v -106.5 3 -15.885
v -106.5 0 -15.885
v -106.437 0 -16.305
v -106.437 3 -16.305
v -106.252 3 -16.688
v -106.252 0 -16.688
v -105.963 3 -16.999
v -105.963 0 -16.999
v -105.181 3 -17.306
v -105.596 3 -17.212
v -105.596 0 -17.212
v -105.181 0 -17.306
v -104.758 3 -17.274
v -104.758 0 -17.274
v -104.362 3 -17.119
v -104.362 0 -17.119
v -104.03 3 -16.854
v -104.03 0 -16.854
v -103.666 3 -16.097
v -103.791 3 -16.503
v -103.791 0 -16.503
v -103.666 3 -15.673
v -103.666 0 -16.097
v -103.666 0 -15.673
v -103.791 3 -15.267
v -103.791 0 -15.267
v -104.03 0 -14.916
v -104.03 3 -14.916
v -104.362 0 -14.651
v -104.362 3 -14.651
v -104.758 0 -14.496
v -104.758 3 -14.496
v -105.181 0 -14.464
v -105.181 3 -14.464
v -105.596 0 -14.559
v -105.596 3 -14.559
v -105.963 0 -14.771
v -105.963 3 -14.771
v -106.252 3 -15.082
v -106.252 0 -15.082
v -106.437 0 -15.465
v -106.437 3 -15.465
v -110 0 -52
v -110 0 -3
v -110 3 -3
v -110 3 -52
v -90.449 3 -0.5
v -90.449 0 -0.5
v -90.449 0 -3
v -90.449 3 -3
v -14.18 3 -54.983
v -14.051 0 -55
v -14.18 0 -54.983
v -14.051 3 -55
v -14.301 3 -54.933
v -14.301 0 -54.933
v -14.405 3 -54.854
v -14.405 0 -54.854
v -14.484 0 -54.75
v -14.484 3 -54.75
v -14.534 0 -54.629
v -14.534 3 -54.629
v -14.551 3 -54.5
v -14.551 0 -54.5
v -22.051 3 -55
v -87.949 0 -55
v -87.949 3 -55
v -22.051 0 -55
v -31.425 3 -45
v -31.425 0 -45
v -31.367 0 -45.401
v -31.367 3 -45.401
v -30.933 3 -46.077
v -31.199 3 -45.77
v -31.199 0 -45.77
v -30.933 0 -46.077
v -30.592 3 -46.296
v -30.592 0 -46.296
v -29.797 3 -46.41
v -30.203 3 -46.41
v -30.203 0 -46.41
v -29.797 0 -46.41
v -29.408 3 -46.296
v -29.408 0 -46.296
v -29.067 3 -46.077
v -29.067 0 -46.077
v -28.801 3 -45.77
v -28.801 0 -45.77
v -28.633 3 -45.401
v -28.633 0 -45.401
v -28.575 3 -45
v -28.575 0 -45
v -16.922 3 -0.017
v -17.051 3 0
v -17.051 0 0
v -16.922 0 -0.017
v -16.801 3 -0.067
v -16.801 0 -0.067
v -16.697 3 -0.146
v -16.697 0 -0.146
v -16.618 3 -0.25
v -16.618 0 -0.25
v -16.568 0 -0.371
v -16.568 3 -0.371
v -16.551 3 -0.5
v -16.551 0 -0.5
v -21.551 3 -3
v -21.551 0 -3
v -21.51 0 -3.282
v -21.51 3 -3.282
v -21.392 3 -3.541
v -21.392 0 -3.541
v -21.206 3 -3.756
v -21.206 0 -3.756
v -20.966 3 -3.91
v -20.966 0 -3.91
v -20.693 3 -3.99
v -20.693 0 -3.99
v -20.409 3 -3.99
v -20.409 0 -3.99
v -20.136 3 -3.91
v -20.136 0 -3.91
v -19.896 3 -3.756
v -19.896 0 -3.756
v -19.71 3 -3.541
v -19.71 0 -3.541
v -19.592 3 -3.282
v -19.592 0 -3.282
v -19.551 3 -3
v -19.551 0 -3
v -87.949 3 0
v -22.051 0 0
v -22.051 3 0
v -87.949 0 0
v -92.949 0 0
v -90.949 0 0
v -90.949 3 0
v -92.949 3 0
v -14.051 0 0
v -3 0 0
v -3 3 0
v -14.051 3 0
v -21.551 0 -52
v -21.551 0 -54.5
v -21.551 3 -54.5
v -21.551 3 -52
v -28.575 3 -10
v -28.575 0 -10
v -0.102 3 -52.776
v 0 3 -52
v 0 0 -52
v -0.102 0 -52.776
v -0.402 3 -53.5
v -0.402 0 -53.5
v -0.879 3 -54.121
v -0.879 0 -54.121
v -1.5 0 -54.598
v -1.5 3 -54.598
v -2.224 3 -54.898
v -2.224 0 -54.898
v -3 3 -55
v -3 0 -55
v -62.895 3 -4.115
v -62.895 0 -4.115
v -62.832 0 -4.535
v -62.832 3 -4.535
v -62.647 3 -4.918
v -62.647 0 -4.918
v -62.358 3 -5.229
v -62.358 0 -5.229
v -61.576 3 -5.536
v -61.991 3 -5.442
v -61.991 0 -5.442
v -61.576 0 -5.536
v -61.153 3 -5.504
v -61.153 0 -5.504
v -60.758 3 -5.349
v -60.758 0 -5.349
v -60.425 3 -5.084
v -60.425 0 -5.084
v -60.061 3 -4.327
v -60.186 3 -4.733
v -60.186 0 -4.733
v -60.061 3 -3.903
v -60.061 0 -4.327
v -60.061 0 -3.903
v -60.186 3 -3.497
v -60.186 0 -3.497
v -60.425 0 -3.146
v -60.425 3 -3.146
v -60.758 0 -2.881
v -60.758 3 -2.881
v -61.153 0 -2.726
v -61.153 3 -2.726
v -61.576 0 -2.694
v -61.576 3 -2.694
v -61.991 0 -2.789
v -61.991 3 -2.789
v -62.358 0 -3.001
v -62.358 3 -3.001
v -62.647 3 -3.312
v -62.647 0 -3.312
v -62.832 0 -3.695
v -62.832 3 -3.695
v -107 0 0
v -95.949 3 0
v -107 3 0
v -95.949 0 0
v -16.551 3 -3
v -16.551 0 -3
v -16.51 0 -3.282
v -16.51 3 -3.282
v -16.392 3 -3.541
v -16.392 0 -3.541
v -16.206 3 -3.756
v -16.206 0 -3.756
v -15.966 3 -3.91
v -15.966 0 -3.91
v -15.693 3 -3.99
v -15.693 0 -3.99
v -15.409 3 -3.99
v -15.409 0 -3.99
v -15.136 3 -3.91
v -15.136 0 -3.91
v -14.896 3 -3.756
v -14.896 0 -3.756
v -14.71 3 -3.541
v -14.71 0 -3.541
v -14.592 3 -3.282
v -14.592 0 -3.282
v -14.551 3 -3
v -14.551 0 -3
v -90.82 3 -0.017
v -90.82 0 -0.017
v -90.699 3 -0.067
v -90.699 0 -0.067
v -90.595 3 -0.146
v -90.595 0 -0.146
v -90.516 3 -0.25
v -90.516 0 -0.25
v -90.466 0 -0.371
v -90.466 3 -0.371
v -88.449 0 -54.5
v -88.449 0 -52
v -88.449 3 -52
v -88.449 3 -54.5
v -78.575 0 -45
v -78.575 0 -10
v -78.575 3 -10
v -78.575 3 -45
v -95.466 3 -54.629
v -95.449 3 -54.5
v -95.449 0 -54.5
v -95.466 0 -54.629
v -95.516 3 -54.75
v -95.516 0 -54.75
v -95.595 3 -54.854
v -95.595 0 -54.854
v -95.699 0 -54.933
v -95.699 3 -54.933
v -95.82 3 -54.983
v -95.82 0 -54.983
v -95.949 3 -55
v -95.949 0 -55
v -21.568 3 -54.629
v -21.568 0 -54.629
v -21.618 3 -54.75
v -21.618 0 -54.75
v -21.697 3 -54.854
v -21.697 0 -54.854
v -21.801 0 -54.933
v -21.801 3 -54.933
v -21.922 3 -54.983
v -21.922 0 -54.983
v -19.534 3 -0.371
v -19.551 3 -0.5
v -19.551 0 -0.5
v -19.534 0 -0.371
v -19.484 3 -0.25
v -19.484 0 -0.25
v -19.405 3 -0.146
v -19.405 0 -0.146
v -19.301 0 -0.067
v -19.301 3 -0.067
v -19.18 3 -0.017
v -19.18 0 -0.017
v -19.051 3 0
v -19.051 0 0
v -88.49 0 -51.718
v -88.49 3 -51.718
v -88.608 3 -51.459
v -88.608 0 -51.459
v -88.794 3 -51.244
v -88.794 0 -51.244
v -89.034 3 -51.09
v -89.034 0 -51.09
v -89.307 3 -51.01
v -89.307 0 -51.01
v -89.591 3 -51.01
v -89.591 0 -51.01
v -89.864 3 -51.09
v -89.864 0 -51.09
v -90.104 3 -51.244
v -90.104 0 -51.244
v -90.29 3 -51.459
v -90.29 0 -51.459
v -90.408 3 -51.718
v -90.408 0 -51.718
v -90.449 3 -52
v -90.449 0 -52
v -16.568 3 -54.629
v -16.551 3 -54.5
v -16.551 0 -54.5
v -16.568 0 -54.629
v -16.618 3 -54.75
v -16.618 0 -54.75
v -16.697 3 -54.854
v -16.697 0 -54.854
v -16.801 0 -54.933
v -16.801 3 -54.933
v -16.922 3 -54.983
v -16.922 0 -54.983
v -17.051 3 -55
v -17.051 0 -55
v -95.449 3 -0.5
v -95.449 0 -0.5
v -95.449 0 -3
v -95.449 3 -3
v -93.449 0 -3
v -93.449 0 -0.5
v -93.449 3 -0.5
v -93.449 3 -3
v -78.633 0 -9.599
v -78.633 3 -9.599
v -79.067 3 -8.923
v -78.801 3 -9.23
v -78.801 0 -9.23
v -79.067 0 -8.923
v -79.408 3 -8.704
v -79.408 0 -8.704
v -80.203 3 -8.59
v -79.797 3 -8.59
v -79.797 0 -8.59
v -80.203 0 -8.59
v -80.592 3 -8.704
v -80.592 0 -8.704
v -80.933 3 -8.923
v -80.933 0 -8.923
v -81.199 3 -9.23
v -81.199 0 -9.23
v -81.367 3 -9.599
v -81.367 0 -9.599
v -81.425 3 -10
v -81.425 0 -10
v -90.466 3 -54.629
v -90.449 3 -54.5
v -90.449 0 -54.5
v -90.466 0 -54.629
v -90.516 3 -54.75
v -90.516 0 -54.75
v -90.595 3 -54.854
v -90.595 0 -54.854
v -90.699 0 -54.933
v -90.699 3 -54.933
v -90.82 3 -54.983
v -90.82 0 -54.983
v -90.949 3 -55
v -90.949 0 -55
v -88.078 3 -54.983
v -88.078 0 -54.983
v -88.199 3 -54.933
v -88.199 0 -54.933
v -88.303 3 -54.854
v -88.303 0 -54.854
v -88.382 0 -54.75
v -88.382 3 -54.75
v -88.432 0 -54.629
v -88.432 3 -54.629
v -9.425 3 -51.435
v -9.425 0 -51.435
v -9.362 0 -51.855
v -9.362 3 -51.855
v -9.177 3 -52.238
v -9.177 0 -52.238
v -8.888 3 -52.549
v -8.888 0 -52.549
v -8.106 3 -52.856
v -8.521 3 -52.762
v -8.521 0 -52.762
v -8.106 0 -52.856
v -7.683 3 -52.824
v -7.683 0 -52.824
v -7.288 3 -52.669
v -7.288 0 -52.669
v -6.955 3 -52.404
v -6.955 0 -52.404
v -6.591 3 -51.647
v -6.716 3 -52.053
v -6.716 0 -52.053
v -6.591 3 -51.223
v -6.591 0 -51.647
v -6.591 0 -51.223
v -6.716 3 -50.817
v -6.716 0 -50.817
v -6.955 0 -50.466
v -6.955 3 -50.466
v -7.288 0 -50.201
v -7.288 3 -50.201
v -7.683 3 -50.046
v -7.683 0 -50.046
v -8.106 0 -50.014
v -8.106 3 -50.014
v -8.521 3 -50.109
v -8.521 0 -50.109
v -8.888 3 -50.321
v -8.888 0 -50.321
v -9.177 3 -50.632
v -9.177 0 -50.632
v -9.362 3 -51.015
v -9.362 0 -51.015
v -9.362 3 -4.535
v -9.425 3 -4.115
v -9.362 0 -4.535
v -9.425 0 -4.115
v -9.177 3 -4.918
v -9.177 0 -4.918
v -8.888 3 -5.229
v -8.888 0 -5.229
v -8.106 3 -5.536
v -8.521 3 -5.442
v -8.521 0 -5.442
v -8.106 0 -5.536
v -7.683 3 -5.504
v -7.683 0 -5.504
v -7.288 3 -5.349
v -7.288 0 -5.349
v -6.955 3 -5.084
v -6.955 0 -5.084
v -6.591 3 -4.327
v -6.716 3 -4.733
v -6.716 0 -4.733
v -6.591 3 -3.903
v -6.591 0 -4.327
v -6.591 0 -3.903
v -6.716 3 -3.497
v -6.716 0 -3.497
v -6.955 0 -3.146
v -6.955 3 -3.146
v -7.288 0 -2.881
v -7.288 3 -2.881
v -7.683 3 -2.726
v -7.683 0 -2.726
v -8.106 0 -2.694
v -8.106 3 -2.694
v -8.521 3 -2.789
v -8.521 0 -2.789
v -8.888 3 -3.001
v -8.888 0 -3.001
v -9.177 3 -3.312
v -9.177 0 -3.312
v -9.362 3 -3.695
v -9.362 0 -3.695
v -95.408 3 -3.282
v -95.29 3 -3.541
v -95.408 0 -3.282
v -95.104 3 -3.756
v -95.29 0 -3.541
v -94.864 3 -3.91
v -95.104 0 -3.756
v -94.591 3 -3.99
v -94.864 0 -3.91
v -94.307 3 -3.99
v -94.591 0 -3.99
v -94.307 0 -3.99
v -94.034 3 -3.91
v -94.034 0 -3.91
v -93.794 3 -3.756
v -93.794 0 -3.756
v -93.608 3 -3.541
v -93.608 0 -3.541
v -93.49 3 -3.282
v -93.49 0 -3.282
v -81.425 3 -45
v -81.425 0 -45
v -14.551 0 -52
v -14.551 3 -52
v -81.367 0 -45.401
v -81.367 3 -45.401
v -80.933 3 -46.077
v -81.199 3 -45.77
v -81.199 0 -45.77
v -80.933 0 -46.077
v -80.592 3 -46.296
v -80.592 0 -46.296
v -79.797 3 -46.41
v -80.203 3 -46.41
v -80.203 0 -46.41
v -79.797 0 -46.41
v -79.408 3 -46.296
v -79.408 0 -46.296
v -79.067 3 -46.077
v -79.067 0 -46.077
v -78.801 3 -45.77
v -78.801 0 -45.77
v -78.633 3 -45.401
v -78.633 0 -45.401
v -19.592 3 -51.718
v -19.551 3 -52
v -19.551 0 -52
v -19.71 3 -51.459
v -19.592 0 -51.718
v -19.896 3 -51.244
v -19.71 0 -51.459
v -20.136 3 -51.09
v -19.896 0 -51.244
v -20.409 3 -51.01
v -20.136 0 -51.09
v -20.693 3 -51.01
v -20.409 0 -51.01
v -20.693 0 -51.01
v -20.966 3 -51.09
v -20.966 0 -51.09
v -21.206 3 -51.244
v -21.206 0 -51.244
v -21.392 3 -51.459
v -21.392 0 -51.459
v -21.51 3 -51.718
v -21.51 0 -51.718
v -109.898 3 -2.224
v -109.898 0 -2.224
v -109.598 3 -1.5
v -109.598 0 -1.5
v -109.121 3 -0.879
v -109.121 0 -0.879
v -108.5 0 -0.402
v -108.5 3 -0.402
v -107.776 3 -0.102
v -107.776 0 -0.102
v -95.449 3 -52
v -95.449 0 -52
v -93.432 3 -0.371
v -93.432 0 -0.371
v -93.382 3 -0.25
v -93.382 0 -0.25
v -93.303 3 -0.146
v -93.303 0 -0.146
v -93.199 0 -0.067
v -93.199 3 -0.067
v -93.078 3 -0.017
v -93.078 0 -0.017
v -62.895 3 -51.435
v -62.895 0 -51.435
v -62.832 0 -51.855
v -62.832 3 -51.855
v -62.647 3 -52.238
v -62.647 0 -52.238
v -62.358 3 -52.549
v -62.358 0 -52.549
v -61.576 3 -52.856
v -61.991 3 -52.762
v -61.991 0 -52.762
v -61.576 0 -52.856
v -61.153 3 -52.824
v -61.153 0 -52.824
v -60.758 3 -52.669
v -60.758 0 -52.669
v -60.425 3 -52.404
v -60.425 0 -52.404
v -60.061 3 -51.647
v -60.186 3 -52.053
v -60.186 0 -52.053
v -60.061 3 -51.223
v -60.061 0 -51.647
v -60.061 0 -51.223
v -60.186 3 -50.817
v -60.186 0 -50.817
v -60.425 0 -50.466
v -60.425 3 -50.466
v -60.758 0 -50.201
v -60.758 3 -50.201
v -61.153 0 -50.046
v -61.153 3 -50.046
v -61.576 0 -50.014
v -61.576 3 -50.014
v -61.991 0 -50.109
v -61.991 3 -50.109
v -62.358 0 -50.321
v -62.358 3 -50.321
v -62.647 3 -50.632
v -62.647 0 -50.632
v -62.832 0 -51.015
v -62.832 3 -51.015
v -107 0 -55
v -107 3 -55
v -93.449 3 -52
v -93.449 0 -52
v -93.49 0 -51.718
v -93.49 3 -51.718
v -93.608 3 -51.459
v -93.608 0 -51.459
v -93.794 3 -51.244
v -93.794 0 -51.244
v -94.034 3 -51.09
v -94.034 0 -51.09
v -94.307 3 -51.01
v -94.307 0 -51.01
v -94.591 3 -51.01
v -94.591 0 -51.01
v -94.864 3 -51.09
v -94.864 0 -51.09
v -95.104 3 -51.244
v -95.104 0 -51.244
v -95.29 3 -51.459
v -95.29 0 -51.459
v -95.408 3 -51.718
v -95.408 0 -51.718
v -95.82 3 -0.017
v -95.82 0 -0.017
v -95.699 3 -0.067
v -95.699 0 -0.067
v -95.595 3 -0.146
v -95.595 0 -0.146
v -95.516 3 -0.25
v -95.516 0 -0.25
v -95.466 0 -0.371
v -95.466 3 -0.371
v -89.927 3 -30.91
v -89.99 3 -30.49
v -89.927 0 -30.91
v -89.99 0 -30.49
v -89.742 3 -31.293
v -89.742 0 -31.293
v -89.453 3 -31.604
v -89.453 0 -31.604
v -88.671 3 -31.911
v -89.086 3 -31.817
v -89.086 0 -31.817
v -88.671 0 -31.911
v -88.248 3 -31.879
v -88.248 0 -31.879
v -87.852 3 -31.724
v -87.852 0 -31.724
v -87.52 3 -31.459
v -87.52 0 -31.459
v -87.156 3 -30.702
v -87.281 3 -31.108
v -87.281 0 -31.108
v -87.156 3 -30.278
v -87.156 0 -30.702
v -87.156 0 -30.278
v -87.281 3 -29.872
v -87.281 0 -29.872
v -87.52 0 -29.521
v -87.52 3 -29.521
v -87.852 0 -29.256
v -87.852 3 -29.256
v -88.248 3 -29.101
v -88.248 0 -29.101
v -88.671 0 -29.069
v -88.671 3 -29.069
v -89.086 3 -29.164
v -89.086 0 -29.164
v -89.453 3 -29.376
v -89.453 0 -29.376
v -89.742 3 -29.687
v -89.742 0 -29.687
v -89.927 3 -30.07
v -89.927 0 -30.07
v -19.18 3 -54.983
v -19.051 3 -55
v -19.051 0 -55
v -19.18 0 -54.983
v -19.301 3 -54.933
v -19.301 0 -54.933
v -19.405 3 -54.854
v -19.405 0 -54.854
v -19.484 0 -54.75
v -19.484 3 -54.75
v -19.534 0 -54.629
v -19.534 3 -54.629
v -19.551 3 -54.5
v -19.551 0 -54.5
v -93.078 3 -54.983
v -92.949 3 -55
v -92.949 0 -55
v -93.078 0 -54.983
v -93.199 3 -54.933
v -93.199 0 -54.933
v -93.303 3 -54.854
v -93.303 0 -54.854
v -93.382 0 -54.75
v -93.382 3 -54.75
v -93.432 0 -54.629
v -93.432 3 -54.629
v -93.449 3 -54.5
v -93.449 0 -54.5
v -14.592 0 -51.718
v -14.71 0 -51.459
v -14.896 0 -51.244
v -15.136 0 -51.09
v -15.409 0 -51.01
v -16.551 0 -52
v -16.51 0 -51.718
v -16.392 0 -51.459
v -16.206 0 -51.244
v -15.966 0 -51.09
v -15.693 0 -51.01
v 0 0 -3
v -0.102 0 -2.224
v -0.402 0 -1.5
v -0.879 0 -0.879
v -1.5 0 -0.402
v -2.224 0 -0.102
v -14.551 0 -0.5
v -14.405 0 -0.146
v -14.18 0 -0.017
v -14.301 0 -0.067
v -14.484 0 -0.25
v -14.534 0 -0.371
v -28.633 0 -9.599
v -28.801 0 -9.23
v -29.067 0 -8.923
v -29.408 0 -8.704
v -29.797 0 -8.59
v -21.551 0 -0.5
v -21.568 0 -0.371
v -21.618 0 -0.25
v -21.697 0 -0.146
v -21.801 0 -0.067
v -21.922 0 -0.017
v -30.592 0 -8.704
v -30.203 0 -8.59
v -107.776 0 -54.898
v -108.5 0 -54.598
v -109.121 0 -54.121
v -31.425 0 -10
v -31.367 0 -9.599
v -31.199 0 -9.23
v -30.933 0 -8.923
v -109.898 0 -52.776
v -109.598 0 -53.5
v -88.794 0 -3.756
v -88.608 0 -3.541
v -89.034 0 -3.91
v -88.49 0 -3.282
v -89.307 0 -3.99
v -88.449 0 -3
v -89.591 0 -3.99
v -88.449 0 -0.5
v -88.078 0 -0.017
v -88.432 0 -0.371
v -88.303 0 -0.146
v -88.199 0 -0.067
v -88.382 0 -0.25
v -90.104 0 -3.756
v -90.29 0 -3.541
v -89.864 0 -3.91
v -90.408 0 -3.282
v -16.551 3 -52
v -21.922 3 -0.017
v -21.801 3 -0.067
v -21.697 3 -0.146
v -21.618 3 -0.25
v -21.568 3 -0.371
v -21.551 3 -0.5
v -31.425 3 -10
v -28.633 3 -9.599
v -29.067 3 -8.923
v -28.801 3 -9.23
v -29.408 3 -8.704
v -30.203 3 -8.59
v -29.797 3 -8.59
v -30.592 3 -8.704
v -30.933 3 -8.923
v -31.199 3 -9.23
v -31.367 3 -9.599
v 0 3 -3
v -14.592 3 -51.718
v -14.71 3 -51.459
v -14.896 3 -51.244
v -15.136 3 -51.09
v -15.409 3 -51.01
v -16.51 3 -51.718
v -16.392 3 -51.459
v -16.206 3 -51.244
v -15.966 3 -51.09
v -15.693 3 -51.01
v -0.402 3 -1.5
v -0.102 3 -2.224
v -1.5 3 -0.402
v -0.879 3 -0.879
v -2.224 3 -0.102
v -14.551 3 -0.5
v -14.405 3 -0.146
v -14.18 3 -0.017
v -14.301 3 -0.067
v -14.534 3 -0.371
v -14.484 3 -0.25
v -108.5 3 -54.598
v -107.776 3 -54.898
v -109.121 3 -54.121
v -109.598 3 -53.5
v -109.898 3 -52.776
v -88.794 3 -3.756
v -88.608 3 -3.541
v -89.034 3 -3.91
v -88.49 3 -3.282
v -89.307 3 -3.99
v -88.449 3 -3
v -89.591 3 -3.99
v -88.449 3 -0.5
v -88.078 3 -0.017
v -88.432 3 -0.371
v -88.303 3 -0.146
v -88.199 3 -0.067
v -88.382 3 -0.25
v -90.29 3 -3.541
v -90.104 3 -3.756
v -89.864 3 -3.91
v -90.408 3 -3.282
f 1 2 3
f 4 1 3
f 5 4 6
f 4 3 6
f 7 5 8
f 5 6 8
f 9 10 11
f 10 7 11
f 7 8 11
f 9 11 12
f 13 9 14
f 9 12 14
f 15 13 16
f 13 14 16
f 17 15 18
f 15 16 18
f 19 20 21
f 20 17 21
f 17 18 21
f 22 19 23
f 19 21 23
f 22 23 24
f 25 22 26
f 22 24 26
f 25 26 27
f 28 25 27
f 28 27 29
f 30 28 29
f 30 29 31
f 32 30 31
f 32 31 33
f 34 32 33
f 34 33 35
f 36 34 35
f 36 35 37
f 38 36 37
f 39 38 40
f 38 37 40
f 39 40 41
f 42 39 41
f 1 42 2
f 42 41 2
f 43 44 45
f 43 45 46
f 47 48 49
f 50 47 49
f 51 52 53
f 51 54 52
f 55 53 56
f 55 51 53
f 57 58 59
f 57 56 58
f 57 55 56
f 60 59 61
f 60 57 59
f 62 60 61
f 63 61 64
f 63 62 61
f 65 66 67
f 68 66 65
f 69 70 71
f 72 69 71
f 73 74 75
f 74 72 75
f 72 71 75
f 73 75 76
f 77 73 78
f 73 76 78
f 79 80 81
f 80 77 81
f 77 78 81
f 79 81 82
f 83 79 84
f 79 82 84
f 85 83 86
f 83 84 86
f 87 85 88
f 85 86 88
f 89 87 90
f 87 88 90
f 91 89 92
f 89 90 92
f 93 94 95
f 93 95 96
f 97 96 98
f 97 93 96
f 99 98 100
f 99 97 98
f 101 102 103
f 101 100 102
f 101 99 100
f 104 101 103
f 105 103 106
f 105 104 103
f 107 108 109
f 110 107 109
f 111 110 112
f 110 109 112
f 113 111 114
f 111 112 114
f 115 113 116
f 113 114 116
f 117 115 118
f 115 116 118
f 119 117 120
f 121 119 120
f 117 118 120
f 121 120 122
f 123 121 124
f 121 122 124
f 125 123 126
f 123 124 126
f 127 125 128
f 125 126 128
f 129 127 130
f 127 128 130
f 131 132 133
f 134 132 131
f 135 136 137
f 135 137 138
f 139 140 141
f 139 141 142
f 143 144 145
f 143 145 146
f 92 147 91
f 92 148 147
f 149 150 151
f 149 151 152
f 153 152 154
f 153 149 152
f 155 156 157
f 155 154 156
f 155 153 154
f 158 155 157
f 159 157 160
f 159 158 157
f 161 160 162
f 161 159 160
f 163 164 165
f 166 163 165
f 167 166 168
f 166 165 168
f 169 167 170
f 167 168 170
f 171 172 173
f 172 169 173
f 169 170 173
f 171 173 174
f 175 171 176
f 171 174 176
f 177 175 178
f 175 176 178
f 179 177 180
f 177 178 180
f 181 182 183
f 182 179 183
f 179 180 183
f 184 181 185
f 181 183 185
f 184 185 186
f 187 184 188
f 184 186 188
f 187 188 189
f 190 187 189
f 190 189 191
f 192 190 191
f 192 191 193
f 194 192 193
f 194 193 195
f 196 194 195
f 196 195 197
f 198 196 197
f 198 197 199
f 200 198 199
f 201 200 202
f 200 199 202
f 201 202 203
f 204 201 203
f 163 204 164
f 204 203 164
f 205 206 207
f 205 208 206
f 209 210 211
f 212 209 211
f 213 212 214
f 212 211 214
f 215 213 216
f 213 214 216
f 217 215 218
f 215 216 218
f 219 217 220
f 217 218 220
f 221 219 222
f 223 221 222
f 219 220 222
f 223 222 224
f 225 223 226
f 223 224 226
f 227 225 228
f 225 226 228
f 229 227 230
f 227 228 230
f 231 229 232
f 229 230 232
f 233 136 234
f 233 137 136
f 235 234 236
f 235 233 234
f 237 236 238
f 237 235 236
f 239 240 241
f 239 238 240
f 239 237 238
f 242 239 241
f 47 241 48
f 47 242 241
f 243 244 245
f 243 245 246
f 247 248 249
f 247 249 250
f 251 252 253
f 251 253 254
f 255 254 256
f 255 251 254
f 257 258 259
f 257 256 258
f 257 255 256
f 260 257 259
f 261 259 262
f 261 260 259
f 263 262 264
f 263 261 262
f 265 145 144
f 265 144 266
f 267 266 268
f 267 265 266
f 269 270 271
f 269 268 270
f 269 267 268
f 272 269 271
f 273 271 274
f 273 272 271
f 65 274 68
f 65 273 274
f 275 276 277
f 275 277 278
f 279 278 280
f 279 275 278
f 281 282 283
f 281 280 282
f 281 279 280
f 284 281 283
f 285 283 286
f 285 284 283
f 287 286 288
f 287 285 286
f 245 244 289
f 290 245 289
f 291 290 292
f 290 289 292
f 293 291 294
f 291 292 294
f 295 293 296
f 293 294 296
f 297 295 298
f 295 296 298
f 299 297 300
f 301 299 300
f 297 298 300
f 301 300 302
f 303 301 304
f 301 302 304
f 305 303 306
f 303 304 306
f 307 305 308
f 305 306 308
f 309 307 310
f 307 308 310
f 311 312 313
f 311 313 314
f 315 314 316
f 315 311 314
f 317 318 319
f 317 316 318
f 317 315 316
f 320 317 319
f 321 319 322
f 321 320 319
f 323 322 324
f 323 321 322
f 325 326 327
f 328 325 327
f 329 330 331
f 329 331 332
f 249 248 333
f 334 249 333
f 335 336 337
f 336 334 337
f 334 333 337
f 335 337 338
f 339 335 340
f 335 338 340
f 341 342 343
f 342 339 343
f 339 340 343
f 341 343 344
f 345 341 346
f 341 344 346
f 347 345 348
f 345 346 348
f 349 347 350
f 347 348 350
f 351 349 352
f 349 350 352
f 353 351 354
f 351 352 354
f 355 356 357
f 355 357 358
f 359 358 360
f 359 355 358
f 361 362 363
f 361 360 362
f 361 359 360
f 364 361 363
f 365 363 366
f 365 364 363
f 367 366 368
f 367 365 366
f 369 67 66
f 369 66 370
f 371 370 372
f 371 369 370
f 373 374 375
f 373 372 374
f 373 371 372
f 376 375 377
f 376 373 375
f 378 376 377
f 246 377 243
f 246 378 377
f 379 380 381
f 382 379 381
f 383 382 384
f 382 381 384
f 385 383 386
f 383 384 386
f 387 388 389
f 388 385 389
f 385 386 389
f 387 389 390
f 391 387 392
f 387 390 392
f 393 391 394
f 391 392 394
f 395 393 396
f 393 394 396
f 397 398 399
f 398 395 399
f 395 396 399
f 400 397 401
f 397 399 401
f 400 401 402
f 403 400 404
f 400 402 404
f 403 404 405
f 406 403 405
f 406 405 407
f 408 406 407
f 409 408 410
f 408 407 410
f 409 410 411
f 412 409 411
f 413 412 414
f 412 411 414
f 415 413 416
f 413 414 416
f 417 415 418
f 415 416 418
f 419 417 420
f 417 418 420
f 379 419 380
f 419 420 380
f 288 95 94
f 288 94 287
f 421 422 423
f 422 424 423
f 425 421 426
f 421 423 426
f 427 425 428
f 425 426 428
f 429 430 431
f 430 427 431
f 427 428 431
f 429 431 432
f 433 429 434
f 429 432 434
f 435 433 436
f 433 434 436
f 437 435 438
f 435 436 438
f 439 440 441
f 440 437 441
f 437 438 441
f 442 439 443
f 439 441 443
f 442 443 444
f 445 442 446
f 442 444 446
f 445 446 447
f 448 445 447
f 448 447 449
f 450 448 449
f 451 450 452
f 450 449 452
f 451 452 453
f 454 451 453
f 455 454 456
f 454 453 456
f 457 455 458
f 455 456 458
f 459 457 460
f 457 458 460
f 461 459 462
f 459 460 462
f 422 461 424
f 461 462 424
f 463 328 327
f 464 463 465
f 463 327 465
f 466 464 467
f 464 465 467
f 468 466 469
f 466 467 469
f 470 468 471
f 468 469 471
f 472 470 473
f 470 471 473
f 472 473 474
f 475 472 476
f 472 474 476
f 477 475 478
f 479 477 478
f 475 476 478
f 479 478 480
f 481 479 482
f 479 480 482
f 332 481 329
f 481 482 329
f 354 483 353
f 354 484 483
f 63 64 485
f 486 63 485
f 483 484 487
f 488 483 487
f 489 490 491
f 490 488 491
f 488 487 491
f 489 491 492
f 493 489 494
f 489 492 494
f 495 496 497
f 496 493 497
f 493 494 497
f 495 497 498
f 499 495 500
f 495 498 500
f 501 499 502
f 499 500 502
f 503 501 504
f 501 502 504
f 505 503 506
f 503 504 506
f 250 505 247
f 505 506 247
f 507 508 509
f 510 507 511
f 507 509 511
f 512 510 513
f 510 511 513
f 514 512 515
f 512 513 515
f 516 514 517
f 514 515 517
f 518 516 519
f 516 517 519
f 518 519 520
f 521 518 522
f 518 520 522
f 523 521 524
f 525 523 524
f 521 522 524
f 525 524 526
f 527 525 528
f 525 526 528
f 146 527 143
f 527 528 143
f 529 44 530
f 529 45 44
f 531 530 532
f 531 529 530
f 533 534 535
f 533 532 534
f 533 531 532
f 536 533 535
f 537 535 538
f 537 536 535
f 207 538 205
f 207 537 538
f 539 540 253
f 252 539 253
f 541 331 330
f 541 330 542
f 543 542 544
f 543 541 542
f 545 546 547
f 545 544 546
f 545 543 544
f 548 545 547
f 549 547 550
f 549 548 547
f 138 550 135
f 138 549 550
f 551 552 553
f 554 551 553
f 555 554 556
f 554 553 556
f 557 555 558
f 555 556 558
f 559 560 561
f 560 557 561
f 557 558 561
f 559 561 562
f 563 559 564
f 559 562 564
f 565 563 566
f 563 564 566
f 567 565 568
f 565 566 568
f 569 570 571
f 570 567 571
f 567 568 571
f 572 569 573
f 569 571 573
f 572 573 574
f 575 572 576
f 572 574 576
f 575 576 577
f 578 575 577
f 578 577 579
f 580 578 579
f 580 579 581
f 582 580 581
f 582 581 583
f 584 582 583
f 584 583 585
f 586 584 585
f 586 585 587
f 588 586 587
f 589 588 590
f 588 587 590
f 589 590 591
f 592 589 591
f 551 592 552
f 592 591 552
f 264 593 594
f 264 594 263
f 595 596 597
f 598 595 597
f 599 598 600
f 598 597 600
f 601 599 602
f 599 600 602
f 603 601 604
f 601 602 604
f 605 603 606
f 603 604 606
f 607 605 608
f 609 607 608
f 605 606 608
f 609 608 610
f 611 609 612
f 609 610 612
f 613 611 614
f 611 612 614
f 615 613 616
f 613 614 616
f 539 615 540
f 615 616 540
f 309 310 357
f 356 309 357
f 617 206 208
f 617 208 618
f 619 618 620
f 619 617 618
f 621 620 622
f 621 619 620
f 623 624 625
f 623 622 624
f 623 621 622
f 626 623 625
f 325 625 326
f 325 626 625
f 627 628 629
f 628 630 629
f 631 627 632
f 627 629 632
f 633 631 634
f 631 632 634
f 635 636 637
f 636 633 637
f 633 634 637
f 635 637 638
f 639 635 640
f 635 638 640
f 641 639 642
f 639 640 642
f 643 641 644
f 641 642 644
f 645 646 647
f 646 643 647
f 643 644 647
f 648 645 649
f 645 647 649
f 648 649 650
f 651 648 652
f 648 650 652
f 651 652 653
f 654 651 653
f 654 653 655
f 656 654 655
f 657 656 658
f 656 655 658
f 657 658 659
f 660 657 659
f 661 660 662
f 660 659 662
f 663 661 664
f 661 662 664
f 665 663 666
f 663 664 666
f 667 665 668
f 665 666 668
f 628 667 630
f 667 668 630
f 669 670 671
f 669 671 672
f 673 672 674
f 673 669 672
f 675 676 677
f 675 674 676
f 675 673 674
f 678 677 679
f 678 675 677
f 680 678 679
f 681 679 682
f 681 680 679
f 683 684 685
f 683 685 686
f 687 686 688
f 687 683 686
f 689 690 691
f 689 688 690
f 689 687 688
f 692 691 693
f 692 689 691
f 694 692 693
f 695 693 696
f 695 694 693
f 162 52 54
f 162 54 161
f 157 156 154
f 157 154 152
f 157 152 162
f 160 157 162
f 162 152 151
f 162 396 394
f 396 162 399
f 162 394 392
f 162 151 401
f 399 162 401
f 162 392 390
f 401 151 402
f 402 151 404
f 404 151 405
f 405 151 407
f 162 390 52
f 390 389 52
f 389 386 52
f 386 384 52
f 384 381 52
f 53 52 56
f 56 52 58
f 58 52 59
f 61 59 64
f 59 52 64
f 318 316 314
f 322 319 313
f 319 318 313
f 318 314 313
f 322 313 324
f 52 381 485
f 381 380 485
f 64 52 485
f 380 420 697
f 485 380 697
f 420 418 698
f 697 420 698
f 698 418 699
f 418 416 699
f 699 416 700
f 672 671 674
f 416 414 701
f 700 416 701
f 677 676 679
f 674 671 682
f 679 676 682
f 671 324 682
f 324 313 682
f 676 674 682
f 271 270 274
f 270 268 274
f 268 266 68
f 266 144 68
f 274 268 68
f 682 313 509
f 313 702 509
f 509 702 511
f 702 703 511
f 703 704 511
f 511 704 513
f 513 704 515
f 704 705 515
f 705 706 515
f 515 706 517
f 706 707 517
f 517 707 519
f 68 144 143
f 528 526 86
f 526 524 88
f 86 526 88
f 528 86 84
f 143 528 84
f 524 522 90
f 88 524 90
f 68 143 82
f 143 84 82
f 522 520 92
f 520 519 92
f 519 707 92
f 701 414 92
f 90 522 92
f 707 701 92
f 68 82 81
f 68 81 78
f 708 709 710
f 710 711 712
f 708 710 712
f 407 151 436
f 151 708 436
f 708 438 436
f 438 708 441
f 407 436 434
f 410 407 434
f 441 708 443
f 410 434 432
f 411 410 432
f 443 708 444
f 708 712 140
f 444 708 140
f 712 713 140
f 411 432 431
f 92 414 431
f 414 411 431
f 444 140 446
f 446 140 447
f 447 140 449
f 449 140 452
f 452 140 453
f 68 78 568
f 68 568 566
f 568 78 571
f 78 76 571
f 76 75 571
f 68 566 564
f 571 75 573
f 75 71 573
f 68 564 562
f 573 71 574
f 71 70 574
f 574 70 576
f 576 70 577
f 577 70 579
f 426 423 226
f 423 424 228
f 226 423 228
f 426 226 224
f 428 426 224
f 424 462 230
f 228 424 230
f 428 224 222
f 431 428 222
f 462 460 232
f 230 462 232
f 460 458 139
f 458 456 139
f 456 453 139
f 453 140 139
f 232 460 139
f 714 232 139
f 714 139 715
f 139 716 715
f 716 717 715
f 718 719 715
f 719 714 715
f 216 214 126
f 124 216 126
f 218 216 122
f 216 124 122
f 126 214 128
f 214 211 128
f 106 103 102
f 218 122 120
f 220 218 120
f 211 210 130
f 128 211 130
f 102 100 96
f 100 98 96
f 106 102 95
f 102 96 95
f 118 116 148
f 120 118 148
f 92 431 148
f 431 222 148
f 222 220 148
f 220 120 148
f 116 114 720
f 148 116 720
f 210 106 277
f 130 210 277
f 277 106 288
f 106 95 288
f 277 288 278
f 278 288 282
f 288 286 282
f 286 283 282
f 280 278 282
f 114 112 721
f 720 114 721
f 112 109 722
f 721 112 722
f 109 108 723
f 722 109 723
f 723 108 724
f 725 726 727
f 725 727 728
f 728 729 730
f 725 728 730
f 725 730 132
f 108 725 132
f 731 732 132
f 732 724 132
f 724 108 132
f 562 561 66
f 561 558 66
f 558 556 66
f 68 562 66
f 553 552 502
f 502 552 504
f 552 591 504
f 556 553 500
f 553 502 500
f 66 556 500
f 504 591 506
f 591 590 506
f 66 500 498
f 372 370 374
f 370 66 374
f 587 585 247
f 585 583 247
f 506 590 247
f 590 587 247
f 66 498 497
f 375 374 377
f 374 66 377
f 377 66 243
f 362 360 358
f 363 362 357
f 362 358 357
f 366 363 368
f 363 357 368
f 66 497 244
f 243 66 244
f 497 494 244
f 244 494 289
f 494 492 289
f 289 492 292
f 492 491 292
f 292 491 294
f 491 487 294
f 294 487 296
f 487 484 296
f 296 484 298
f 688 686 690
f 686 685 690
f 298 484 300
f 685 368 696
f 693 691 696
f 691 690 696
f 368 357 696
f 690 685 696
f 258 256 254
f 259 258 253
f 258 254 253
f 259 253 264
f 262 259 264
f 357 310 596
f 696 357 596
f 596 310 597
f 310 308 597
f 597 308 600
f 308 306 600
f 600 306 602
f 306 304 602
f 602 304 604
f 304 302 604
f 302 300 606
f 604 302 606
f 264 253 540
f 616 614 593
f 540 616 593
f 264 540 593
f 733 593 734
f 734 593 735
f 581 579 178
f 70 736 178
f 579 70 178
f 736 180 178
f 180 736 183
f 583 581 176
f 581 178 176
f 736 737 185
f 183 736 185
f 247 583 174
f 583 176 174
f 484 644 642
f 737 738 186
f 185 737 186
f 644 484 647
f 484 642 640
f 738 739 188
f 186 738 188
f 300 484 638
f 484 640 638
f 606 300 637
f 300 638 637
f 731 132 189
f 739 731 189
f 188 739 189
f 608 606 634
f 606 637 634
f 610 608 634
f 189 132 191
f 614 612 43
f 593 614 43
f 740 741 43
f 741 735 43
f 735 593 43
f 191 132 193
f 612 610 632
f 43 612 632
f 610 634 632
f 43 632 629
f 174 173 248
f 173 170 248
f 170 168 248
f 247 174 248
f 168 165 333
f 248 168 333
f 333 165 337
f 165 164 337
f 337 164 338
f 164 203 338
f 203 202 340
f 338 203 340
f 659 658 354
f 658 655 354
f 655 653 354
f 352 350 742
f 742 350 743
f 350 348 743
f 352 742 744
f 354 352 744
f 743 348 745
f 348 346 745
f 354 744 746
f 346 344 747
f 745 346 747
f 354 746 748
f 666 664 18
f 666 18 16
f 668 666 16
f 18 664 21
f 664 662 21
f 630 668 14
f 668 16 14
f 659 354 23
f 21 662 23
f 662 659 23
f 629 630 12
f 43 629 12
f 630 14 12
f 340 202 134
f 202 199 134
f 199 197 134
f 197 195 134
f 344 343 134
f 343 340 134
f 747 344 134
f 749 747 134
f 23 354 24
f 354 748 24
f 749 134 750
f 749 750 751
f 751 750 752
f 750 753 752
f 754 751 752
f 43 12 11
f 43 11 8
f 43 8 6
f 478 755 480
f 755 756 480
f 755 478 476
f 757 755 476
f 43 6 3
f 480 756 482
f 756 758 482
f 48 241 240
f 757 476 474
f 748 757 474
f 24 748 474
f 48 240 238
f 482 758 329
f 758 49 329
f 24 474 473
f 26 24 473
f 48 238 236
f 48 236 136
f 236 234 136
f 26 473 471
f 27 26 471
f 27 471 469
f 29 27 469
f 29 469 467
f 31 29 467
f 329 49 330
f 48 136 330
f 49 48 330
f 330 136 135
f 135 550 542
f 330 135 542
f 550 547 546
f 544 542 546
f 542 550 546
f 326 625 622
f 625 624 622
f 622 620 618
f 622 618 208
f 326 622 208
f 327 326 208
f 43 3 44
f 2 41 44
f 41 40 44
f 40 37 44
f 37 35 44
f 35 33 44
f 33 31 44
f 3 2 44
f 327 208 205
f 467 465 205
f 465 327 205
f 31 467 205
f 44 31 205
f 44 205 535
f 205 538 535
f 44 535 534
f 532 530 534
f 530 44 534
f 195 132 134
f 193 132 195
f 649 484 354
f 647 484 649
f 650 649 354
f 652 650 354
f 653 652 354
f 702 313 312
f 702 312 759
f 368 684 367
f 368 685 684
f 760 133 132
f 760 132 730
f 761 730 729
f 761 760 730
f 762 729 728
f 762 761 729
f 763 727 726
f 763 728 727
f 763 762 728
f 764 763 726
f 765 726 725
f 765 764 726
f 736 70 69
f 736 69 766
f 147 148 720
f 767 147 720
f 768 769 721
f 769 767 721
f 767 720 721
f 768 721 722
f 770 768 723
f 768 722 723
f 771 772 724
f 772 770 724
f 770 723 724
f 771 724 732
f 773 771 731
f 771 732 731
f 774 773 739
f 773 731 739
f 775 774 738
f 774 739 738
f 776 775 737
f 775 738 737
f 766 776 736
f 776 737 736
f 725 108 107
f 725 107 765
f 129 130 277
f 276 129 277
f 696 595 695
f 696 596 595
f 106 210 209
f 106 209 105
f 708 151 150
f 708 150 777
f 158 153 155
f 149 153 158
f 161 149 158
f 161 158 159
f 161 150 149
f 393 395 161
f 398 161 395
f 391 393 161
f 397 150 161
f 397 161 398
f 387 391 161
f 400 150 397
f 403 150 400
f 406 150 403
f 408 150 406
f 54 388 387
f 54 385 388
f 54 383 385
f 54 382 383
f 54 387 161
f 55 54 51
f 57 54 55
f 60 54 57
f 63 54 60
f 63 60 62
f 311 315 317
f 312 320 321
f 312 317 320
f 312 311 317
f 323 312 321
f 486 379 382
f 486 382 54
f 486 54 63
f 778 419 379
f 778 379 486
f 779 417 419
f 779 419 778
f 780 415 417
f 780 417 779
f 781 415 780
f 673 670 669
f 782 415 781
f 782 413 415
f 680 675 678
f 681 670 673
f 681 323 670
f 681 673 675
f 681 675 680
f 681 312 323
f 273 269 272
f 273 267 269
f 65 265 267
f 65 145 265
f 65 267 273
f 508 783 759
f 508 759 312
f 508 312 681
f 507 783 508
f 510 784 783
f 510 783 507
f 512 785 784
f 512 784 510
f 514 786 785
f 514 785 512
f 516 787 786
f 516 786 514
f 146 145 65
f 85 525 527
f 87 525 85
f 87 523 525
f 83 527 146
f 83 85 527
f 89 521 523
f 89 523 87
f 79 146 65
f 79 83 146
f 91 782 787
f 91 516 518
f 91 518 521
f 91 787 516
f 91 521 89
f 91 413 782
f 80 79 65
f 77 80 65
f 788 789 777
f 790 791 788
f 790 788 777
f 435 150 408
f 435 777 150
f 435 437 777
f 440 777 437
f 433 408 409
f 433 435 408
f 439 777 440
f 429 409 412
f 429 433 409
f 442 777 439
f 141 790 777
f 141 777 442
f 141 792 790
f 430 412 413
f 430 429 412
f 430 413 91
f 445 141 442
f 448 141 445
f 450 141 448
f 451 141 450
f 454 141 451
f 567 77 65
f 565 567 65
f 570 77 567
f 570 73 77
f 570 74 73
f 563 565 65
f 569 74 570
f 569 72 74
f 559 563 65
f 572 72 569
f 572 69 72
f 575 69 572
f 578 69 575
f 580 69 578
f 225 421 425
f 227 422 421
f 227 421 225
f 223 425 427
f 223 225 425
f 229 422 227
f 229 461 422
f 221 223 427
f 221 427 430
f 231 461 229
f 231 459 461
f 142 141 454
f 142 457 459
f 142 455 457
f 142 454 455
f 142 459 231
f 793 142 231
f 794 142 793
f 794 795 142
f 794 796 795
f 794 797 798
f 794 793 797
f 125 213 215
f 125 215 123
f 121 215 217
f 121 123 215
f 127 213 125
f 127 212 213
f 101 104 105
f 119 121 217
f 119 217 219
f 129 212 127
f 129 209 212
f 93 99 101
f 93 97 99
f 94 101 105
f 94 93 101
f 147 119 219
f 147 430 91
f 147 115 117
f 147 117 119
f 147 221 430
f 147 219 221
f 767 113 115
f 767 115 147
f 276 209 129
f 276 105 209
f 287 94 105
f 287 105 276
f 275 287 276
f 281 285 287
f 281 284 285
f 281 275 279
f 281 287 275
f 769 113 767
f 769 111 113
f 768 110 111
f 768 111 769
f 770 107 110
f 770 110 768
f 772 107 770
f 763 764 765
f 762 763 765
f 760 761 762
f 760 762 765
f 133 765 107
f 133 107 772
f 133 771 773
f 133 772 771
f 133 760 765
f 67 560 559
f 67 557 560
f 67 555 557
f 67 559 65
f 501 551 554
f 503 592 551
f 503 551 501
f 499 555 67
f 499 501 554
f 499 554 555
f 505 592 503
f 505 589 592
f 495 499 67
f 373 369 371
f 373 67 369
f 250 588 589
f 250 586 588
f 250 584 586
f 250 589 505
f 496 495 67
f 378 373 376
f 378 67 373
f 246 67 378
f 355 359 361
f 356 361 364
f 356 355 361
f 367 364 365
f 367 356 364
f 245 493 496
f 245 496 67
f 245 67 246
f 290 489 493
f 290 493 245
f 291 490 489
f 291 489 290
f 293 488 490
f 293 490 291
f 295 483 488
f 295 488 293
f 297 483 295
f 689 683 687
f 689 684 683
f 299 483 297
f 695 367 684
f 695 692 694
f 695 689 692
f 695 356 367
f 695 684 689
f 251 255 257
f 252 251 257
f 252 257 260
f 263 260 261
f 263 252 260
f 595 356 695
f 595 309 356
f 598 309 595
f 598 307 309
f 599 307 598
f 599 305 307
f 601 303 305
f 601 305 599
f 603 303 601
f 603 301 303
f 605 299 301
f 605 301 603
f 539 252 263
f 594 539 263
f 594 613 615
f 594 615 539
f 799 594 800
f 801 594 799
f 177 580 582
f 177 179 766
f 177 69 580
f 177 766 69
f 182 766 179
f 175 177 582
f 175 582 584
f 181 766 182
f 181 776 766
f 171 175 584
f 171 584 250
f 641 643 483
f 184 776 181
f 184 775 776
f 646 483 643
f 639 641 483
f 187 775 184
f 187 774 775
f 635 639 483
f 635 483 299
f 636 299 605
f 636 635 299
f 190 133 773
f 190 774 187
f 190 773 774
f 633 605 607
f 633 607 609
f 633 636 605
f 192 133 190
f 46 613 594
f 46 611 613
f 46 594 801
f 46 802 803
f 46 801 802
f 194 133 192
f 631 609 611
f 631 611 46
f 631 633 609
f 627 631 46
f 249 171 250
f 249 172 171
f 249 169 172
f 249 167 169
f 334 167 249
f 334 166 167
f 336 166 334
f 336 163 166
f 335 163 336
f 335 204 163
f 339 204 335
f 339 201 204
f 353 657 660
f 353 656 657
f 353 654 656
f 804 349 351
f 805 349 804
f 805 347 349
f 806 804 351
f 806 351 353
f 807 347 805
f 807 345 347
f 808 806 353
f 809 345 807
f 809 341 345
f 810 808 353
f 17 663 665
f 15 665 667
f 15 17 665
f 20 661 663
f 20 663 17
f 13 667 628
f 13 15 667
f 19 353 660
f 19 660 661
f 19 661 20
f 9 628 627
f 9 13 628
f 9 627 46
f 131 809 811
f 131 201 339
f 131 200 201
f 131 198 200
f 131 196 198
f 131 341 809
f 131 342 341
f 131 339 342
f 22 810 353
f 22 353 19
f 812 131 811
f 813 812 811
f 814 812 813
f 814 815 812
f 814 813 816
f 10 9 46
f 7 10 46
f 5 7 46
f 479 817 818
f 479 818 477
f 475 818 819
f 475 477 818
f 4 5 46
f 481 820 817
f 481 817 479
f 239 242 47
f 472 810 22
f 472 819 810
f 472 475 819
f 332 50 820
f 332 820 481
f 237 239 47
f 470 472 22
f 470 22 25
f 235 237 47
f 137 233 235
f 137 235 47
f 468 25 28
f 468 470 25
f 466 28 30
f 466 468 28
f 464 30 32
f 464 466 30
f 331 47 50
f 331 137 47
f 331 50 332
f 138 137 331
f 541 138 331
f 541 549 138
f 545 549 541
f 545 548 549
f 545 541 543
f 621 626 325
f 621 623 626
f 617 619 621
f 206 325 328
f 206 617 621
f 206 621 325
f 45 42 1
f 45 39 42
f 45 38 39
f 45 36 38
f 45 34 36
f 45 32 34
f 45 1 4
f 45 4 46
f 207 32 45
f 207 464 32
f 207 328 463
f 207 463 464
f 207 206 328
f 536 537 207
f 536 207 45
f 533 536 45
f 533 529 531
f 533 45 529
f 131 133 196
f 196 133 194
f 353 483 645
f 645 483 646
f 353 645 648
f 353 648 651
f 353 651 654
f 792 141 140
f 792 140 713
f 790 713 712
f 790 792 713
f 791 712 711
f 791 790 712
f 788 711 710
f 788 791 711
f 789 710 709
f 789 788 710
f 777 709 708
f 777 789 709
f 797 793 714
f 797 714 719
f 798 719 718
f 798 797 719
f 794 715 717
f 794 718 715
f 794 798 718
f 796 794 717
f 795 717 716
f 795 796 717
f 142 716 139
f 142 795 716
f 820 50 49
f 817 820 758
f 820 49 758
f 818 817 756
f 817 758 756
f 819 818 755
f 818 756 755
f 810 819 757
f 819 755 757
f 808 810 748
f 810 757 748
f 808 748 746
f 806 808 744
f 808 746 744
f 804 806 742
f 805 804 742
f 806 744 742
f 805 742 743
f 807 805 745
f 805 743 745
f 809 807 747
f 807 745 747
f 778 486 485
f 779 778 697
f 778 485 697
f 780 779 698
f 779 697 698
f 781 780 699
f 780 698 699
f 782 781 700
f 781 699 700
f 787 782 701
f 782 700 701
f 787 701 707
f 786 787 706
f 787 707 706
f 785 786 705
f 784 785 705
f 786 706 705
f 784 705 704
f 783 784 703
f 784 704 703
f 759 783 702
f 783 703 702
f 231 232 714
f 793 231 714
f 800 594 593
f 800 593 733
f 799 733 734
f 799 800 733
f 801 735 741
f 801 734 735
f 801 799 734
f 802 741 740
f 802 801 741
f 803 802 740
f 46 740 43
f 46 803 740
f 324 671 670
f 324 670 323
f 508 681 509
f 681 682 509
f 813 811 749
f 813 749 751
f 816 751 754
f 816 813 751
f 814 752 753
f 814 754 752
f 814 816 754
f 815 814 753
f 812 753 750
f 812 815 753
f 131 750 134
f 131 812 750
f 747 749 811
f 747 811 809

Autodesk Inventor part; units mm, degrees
ref_plane "YZ Plane" through (0, 0, 0) normal (1, 0, 0) x (0, 1, 0)
ref_plane "XZ Plane" through (0, 0, 0) normal (0, 1, 0) x (-1, 0, 0)
ref_plane "XY Plane" through (0, 0, 0) normal (0, 0, 1) x (1, 0, 0)
sketch "Sketch1" plane through (0, 0, 0) normal (0, 1, 0) x (-1, 0, 0)
  line L0 (0, 0) -> (110, 0)
  line L1 (110, 0) -> (110, -55)
  line L2 (110, -55) -> (0, -55)
  line L3 (0, -55) -> (0, 0)
  line L4 (55, 0) -> (55, -55) construction
  circle A0 centre (8, -4.1151) radius 1.425
  circle A1 centre (8, -51.4351) radius 1.425
  circle A2 centre (61.47, -4.1151) radius 1.425
  circle A3 centre (61.47, -51.4351) radius 1.425
  line L5 (8, -4.1151) -> (61.47, -4.1151) construction
  line L6 (61.47, -4.1151) -> (61.47, -51.4351) construction
  line L7 (61.47, -51.4351) -> (8, -51.4351) construction
  line L8 (8, -51.4351) -> (8, -4.1151) construction
  line L9 (80, -10) -> (80, -45) construction
  line L10 (78.575, -10) -> (78.575, -45)
  line L11 (81.425, -45) -> (81.425, -10)
  arc A4 (81.425, -10) -> (78.575, -10) centre (80, -10) ccw
  arc A5 (78.575, -45) -> (81.425, -45) centre (80, -45) ccw
  line L12 (30, -10) -> (30, -45) construction
  line L13 (28.575, -10) -> (28.575, -45)
  line L14 (31.425, -45) -> (31.425, -10)
  arc A6 (31.425, -10) -> (28.575, -10) centre (30, -10) ccw
  arc A7 (28.575, -45) -> (31.425, -45) centre (30, -45) ccw
  circle A8 centre (105.075, -15.8851) radius 1.425
  circle A9 centre (88.565, -30.4901) radius 1.425
  line L15 (108, -12.9601) -> (86.41, -12.9601) construction
  line L16 (86.41, -12.9601) -> (86.41, -43.4401) construction
  line L17 (86.41, -43.4401) -> (108, -43.4401) construction
  line L18 (108, -43.4401) -> (108, -12.9601) construction
  line L19 (105.075, -15.8851) -> (108, -15.8851) construction
  line L20 (105.075, -15.8851) -> (105.075, -12.9601) construction
  point P0 (80, -27.5)
  point P1 (30, -27.5)
  point P2 (55, -27.5)
  dimension "d4" = 53.47
  dimension "d5" = 47.32
  dimension "d12" = 1.425
  dimension "d13" = 50
  dimension "d14" = 2.85
  dimension "d15" = 14.605
  dimension "d16" = 16.51
  dimension "d17" = 21.59
  dimension "d18" = 30.48
  dimension "d19" = 2.925
  dimension "d20" = 8
  dimension "d21" = 2
  dimension "d22" = 55
  dimension "d23" = 110
  dimension "d34" = 35
extrude "Extrusion1" add sketch "Sketch1" along normal blind 3
fillet "Fillet1" radius 3 4 edges at (0, 1.5, -55) (-110, 1.5, -55) (0, 1.5, 0) (-110, 1.5, 0)
sketch "Sketch2" plane through (0, 0, 0) normal (0, -1, 0) x (1, 0, 0)
  arc A0 (-28.575, -10) -> (-31.425, -10) centre (-30, -10) ccw projected
  line L0 (-28.575, -10) -> (-28.575, -45) projected
  arc A1 (-31.425, -45) -> (-28.575, -45) centre (-30, -45) ccw projected
  line L1 (-31.425, -45) -> (-31.425, -10) projected
  arc A2 (-78.575, -10) -> (-81.425, -10) centre (-80, -10) ccw projected
  line L2 (-78.575, -10) -> (-78.575, -45) projected
  arc A3 (-81.425, -45) -> (-78.575, -45) centre (-80, -45) ccw projected
  line L3 (-81.425, -45) -> (-81.425, -10) projected
  circle A4 centre (-88.565, -30.4901) radius 1.425 projected
  circle A5 centre (-105.075, -15.8851) radius 1.425 projected
  circle A6 centre (-61.47, -51.4351) radius 1.425 projected
  circle A7 centre (-61.47, -4.1151) radius 1.425 projected
  circle A8 centre (-8, -51.4351) radius 1.425 projected
  circle A9 centre (-8, -4.1151) radius 1.425 projected
  arc A10 (-107, 0) -> (-110, -3) centre (-107, -3) ccw projected
  line L4 (-110, -3) -> (-110, -52) projected
  arc A11 (-110, -52) -> (-107, -55) centre (-107, -52) ccw projected
  line L5 (-107, -55) -> (-3, -55) projected
  arc A12 (-3, -55) -> (0, -52) centre (-3, -52) ccw projected
  line L6 (0, -52) -> (0, -3) projected
  arc A13 (0, -3) -> (-3, 0) centre (-3, -3) ccw projected
  line L7 (-3, 0) -> (-107, 0) projected
  line L8 (-107, 0) -> (-3, 0) projected
  circle A14 centre (-20.937, 0) radius 1.5
  line L9 (-3, -55) -> (-107, -55) projected
  line L10 (-55, -55) -> (-55, 0) construction
  line L11 (-110, -52) -> (-110, -3) projected
  line L12 (-110, -27.5) -> (0, -27.5) construction
  circle A15 centre (-15.937, 0) radius 1.5
  circle A16 centre (-89.063, 0) radius 1.5
  circle A17 centre (-94.063, 0) radius 1.5
  circle A18 centre (-20.937, -55) radius 1.5
  circle A19 centre (-15.937, -55) radius 1.5
  circle A20 centre (-89.063, -55) radius 1.5
  circle A21 centre (-94.063, -55) radius 1.5
  point P0 (0, 0)
  dimension "d24" = 3
  dimension "d27" = 5
extrude "Extrusion2" [suppressed]
sketch "Sketch3" plane through (0, 0, 0) normal (0, -1, 0) x (1, 0, 0)
  line L0 (-3, 0) -> (-107, 0) projected
  line L1 (0, -52) -> (0, -3) projected
  line L2 (-107, -55) -> (-3, -55) projected
  line L3 (-110, -3) -> (-110, -52) projected
  circle A0 centre (-20.551, -3) radius 1
  circle A1 centre (-15.551, -3) radius 1
  line L4 (-21.551, -3) -> (-21.551, 0)
  line L5 (-19.551, -3) -> (-19.551, 0)
  line L6 (-16.551, -3) -> (-16.551, 0)
  line L7 (-14.551, -3) -> (-14.551, 0)
  point P0 (0, 0)
  dimension "d28" = 2
  dimension "d29" = 5
  dimension "d30" = 3
extrude "Extrusion3" cut sketch "Sketch3" against normal through all
ref_plane "Work Plane1" through (-107, 0, -27.5) normal (0, 0, 1) x (1, 0, 0)
ref_plane "Work Plane2" through (-55, 0, -3) normal (1, 0, 0) x (0, 0, -1)
mirror "Mirror1" about plane through (-107, 0, -27.5) normal (0, 0, 1) of "Extrusion3"
mirror "Mirror2" about plane through (-55, 0, -3) normal (1, 0, 0) of "Extrusion3", "Mirror1"
fillet "Fillet2" radius 0.5 16 edges at (-21.551, 1.5, 0) (-19.551, 1.5, 0) (-16.551, 1.5, 0) (-14.551, 1.5, 0) (-14.551, 1.5, -55) (-16.551, 1.5, -55) (-19.551, 1.5, -55) (-21.551, 1.5, -55) (-88.449, 1.5, -55) (-90.449, 1.5, -55) (-93.449, 1.5, -55) (-95.449, 1.5, -55) (-95.449, 1.5, 0) (-93.449, 1.5, 0) (-90.449, 1.5, 0) (-88.449, 1.5, 0)
properties part number "electronics_pouch" material "Wood (Birch)"
